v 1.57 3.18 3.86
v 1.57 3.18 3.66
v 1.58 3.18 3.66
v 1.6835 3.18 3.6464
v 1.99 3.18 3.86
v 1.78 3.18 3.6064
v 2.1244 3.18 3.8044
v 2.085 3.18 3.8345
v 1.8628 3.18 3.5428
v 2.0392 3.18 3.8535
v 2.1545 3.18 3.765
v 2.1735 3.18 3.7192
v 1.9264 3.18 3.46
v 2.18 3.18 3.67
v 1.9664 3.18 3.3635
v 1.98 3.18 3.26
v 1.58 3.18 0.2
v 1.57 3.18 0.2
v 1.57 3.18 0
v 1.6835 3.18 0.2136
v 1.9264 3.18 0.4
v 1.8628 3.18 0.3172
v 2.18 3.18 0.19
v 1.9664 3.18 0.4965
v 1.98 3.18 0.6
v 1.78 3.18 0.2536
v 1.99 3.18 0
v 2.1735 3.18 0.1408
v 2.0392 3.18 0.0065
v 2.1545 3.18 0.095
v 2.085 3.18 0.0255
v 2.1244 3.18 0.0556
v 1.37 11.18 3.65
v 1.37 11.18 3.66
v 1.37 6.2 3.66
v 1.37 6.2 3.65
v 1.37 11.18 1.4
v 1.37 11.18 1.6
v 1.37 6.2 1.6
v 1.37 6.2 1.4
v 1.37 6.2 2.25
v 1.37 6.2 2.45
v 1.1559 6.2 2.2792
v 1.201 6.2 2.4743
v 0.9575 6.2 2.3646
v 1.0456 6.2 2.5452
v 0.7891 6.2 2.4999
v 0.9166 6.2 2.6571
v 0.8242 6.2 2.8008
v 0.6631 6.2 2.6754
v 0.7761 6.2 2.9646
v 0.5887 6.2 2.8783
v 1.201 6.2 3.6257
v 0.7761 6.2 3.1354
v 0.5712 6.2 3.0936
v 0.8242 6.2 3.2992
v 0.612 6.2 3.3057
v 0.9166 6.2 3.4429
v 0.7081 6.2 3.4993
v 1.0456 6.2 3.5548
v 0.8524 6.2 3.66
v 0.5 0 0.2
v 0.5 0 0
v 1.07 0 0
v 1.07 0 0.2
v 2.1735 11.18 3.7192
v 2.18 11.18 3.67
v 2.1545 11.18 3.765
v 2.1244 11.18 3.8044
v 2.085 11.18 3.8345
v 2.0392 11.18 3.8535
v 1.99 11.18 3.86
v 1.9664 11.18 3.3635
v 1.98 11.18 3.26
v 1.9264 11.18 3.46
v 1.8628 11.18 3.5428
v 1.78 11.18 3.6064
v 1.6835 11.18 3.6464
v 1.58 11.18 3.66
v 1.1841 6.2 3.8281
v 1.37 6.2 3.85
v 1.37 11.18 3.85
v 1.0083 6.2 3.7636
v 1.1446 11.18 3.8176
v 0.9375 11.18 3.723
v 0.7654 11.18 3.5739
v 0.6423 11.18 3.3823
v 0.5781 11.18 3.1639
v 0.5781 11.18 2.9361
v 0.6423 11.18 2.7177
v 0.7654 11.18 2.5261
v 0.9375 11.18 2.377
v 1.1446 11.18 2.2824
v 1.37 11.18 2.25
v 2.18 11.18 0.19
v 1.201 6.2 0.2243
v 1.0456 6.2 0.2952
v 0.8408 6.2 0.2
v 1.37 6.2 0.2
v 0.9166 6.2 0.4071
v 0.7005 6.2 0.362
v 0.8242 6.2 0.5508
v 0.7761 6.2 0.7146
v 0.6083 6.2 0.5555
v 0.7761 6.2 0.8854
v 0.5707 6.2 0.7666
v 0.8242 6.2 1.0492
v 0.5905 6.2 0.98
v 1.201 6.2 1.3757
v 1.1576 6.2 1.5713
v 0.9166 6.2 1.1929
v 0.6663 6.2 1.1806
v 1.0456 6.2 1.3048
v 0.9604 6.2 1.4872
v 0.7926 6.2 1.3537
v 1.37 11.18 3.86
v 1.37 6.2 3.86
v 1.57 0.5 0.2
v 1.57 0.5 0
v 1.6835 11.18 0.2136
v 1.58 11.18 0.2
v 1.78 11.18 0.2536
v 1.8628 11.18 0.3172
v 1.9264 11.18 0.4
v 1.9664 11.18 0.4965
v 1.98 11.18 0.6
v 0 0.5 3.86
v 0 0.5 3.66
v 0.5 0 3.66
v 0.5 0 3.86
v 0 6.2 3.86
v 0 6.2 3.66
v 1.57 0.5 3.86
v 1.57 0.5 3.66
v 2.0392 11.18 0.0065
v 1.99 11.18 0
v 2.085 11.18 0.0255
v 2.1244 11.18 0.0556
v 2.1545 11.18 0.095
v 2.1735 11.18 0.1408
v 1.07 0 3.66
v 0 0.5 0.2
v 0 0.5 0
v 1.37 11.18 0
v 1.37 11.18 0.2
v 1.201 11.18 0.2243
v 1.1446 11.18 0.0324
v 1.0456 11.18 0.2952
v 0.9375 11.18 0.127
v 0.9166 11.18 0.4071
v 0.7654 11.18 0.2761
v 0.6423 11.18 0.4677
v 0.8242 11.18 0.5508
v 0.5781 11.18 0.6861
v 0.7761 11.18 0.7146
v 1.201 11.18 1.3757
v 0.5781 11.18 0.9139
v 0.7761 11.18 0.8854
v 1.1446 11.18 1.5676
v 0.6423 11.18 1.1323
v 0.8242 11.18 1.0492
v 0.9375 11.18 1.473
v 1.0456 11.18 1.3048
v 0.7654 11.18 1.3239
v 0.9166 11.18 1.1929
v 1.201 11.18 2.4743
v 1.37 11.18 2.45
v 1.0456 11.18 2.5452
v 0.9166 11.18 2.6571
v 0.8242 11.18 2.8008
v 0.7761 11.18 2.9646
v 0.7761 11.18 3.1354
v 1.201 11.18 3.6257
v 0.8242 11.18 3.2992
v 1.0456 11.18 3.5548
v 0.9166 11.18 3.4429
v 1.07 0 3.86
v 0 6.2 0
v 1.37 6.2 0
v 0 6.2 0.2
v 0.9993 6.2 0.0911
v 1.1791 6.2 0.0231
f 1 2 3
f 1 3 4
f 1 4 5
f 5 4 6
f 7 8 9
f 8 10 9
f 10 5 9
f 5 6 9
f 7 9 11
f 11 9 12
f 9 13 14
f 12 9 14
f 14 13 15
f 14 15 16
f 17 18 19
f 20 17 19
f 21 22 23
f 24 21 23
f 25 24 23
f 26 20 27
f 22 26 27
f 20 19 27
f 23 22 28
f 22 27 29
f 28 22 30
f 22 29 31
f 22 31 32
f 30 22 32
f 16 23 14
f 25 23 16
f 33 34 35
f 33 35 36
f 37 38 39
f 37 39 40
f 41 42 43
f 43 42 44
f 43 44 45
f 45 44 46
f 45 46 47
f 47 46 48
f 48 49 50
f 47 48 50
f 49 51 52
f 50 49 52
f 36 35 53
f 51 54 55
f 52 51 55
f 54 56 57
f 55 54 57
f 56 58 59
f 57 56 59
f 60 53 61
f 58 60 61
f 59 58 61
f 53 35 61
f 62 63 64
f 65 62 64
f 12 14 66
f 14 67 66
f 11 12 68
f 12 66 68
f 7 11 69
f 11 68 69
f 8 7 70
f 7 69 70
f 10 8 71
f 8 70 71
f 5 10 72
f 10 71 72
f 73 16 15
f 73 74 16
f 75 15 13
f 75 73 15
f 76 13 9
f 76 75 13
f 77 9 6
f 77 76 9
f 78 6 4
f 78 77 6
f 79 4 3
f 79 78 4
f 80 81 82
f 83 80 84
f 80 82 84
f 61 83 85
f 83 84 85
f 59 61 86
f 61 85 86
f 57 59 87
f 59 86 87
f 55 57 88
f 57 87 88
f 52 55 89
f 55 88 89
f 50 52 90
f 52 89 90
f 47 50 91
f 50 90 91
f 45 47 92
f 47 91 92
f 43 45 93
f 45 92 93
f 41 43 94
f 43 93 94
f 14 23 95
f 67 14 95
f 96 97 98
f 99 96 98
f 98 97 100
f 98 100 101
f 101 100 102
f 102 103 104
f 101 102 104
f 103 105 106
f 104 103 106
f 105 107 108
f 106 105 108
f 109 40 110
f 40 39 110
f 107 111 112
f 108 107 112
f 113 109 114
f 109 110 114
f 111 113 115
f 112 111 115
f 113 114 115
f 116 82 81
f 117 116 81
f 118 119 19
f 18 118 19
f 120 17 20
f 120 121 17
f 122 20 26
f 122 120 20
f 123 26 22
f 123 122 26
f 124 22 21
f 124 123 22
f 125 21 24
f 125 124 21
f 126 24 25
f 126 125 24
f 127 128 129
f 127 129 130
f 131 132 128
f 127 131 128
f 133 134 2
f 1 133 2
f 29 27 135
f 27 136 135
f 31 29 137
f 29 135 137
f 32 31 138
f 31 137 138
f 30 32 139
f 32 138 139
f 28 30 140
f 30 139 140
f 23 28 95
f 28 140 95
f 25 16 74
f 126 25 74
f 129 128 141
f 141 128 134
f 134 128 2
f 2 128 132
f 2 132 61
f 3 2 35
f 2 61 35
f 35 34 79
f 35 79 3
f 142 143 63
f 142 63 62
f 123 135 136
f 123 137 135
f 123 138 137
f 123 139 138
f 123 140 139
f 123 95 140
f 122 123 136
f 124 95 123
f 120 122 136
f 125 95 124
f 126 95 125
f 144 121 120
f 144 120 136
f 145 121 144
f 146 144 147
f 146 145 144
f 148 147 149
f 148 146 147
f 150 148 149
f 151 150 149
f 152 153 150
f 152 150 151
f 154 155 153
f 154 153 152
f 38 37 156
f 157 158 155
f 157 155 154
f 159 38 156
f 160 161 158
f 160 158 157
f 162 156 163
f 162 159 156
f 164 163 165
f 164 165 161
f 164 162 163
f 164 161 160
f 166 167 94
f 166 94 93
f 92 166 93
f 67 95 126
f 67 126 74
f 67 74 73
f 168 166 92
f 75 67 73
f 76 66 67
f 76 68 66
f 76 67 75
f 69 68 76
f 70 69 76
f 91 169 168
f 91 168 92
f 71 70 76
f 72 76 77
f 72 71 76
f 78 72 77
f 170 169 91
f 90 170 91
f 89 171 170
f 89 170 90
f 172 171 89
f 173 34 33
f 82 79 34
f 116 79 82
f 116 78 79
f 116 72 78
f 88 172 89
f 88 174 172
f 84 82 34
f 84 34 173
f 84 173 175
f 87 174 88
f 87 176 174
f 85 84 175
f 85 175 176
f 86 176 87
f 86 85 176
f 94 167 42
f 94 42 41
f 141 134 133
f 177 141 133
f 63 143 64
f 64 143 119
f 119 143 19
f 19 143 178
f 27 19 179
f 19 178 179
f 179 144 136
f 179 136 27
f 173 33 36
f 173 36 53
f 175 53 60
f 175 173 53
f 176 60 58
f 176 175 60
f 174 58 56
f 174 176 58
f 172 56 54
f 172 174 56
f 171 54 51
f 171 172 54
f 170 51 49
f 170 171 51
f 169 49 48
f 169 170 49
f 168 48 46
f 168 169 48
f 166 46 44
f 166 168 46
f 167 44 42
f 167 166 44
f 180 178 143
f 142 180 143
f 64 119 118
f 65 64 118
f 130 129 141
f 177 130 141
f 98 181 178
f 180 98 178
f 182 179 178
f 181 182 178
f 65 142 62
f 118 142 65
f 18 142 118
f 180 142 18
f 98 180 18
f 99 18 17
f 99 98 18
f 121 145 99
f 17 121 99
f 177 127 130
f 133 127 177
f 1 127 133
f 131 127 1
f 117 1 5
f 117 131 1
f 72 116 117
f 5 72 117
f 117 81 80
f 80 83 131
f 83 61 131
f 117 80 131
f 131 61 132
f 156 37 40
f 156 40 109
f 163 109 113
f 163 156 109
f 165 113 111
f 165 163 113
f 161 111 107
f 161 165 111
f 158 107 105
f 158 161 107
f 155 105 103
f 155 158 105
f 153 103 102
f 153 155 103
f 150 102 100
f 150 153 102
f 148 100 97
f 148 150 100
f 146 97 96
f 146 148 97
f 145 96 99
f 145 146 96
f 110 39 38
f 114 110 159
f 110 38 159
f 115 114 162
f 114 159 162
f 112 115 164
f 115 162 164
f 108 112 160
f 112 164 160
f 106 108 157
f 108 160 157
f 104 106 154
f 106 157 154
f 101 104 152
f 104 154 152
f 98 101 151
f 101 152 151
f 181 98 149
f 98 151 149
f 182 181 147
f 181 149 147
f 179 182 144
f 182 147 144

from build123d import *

# Parameters (mm, degrees)
PAD001_DEPTH    = 0.2
CHAMFER001_SIZE = 0.5
SKETCH002_W     = 8
SKETCH002_H     = 3.86
PAD002_DEPTH    = 0.2
PAD004_DEPTH    = 4.98
PAD003_DEPTH    = 4.98
PAD_DEPTH       = 0.2
CHAMFER_SIZE    = 0.5
FILLET_R        = 0.4
FILLET001_R     = 0.19


with BuildPart() as body001:
    # Sketch001 → Pad001 (new body)
    with BuildSketch(Plane.XY.offset(3.66)):
        Polygon((0, 0), (1.57, 0), (1.57, 3.18), (2.18, 3.18), (2.18, 11.18), (1.37, 11.18), (1.37, 6.2), (0, 6.2), align=None)
    extrude(amount=PAD001_DEPTH)

    # Chamfer001
    chamfer001_edges = [body001.edges().sort_by_distance(p)[0] for p in [
        (1.57, 0, 3.76),
        (0, 0, 3.76),
    ]]
    chamfer(chamfer001_edges, length=CHAMFER001_SIZE)

    # Sketch002 (on Face11 of Chamfer001) → Pad002 (join)
    with BuildSketch(Plane.YZ.offset(2.18)):
        with Locations((7.18, 1.93)):
            Rectangle(SKETCH002_W, SKETCH002_H)
    extrude(amount=-PAD002_DEPTH)


with BuildPart() as body003:
    # Sketch004 → Pad004 (new body)
    with BuildSketch(Plane.XZ):
        with BuildLine():
            Line((1.37, 0.2), (1.37, 0))
            ThreePointArc((1.37, 1.6), (0.57, 0.8), (1.37, 0))
            Line((1.37, 1.6), (1.37, 1.4))
            ThreePointArc((1.37, 1.4), (0.77, 0.8), (1.37, 0.2))
        make_face()
    extrude(amount=PAD004_DEPTH)


with BuildPart() as body003_1:
    # Body003 placement: moved
    add(body003.part.moved(Location((0, 11.18, 2.25))))


with BuildPart() as body002:
    # Sketch003 → Pad003 (new body)
    with BuildSketch(Plane.XZ):
        with BuildLine():
            Line((1.37, 0.2), (1.37, 0))
            ThreePointArc((1.37, 1.6), (0.57, 0.8), (1.37, 0))
            Line((1.37, 1.6), (1.37, 1.4))
            ThreePointArc((1.37, 1.4), (0.77, 0.8), (1.37, 0.2))
        make_face()
    extrude(amount=PAD003_DEPTH)


with BuildPart() as body002_1:
    # Body002 placement: moved
    add(body002.part.moved(Location((0, 11.18, 0))))


with BuildPart() as body:
    # Sketch → Pad (new body)
    with BuildSketch(Plane.XY):
        Polygon((0, 0), (1.57, 0), (1.57, 3.18), (2.18, 3.18), (2.18, 11.18), (1.37, 11.18), (1.37, 6.2), (0, 6.2), align=None)
    extrude(amount=PAD_DEPTH)

    # Chamfer
    chamfer_edges = [body.edges().sort_by_distance(p)[0] for p in [
        (1.57, 0, 0.1),
        (0, 0, 0.1),
    ]]
    chamfer(chamfer_edges, length=CHAMFER_SIZE)

    # Boolean: union Body001, Body003, Body002
    add(body001.part)
    add(body003_1.part)
    add(body002_1.part)

    # Fillet
    fillet_edges = [body.edges().sort_by_distance(p)[0] for p in [
        (1.98, 7.18, 0.2),
        (1.98, 7.18, 3.66),
    ]]
    fillet(fillet_edges, radius=FILLET_R)

    # Fillet001
    fillet001_edges = [body.edges().sort_by_distance(p)[0] for p in [
        (2.18, 7.18, 0),
        (2.18, 7.18, 3.86),
    ]]
    fillet(fillet001_edges, radius=FILLET001_R)


solid = body.part
